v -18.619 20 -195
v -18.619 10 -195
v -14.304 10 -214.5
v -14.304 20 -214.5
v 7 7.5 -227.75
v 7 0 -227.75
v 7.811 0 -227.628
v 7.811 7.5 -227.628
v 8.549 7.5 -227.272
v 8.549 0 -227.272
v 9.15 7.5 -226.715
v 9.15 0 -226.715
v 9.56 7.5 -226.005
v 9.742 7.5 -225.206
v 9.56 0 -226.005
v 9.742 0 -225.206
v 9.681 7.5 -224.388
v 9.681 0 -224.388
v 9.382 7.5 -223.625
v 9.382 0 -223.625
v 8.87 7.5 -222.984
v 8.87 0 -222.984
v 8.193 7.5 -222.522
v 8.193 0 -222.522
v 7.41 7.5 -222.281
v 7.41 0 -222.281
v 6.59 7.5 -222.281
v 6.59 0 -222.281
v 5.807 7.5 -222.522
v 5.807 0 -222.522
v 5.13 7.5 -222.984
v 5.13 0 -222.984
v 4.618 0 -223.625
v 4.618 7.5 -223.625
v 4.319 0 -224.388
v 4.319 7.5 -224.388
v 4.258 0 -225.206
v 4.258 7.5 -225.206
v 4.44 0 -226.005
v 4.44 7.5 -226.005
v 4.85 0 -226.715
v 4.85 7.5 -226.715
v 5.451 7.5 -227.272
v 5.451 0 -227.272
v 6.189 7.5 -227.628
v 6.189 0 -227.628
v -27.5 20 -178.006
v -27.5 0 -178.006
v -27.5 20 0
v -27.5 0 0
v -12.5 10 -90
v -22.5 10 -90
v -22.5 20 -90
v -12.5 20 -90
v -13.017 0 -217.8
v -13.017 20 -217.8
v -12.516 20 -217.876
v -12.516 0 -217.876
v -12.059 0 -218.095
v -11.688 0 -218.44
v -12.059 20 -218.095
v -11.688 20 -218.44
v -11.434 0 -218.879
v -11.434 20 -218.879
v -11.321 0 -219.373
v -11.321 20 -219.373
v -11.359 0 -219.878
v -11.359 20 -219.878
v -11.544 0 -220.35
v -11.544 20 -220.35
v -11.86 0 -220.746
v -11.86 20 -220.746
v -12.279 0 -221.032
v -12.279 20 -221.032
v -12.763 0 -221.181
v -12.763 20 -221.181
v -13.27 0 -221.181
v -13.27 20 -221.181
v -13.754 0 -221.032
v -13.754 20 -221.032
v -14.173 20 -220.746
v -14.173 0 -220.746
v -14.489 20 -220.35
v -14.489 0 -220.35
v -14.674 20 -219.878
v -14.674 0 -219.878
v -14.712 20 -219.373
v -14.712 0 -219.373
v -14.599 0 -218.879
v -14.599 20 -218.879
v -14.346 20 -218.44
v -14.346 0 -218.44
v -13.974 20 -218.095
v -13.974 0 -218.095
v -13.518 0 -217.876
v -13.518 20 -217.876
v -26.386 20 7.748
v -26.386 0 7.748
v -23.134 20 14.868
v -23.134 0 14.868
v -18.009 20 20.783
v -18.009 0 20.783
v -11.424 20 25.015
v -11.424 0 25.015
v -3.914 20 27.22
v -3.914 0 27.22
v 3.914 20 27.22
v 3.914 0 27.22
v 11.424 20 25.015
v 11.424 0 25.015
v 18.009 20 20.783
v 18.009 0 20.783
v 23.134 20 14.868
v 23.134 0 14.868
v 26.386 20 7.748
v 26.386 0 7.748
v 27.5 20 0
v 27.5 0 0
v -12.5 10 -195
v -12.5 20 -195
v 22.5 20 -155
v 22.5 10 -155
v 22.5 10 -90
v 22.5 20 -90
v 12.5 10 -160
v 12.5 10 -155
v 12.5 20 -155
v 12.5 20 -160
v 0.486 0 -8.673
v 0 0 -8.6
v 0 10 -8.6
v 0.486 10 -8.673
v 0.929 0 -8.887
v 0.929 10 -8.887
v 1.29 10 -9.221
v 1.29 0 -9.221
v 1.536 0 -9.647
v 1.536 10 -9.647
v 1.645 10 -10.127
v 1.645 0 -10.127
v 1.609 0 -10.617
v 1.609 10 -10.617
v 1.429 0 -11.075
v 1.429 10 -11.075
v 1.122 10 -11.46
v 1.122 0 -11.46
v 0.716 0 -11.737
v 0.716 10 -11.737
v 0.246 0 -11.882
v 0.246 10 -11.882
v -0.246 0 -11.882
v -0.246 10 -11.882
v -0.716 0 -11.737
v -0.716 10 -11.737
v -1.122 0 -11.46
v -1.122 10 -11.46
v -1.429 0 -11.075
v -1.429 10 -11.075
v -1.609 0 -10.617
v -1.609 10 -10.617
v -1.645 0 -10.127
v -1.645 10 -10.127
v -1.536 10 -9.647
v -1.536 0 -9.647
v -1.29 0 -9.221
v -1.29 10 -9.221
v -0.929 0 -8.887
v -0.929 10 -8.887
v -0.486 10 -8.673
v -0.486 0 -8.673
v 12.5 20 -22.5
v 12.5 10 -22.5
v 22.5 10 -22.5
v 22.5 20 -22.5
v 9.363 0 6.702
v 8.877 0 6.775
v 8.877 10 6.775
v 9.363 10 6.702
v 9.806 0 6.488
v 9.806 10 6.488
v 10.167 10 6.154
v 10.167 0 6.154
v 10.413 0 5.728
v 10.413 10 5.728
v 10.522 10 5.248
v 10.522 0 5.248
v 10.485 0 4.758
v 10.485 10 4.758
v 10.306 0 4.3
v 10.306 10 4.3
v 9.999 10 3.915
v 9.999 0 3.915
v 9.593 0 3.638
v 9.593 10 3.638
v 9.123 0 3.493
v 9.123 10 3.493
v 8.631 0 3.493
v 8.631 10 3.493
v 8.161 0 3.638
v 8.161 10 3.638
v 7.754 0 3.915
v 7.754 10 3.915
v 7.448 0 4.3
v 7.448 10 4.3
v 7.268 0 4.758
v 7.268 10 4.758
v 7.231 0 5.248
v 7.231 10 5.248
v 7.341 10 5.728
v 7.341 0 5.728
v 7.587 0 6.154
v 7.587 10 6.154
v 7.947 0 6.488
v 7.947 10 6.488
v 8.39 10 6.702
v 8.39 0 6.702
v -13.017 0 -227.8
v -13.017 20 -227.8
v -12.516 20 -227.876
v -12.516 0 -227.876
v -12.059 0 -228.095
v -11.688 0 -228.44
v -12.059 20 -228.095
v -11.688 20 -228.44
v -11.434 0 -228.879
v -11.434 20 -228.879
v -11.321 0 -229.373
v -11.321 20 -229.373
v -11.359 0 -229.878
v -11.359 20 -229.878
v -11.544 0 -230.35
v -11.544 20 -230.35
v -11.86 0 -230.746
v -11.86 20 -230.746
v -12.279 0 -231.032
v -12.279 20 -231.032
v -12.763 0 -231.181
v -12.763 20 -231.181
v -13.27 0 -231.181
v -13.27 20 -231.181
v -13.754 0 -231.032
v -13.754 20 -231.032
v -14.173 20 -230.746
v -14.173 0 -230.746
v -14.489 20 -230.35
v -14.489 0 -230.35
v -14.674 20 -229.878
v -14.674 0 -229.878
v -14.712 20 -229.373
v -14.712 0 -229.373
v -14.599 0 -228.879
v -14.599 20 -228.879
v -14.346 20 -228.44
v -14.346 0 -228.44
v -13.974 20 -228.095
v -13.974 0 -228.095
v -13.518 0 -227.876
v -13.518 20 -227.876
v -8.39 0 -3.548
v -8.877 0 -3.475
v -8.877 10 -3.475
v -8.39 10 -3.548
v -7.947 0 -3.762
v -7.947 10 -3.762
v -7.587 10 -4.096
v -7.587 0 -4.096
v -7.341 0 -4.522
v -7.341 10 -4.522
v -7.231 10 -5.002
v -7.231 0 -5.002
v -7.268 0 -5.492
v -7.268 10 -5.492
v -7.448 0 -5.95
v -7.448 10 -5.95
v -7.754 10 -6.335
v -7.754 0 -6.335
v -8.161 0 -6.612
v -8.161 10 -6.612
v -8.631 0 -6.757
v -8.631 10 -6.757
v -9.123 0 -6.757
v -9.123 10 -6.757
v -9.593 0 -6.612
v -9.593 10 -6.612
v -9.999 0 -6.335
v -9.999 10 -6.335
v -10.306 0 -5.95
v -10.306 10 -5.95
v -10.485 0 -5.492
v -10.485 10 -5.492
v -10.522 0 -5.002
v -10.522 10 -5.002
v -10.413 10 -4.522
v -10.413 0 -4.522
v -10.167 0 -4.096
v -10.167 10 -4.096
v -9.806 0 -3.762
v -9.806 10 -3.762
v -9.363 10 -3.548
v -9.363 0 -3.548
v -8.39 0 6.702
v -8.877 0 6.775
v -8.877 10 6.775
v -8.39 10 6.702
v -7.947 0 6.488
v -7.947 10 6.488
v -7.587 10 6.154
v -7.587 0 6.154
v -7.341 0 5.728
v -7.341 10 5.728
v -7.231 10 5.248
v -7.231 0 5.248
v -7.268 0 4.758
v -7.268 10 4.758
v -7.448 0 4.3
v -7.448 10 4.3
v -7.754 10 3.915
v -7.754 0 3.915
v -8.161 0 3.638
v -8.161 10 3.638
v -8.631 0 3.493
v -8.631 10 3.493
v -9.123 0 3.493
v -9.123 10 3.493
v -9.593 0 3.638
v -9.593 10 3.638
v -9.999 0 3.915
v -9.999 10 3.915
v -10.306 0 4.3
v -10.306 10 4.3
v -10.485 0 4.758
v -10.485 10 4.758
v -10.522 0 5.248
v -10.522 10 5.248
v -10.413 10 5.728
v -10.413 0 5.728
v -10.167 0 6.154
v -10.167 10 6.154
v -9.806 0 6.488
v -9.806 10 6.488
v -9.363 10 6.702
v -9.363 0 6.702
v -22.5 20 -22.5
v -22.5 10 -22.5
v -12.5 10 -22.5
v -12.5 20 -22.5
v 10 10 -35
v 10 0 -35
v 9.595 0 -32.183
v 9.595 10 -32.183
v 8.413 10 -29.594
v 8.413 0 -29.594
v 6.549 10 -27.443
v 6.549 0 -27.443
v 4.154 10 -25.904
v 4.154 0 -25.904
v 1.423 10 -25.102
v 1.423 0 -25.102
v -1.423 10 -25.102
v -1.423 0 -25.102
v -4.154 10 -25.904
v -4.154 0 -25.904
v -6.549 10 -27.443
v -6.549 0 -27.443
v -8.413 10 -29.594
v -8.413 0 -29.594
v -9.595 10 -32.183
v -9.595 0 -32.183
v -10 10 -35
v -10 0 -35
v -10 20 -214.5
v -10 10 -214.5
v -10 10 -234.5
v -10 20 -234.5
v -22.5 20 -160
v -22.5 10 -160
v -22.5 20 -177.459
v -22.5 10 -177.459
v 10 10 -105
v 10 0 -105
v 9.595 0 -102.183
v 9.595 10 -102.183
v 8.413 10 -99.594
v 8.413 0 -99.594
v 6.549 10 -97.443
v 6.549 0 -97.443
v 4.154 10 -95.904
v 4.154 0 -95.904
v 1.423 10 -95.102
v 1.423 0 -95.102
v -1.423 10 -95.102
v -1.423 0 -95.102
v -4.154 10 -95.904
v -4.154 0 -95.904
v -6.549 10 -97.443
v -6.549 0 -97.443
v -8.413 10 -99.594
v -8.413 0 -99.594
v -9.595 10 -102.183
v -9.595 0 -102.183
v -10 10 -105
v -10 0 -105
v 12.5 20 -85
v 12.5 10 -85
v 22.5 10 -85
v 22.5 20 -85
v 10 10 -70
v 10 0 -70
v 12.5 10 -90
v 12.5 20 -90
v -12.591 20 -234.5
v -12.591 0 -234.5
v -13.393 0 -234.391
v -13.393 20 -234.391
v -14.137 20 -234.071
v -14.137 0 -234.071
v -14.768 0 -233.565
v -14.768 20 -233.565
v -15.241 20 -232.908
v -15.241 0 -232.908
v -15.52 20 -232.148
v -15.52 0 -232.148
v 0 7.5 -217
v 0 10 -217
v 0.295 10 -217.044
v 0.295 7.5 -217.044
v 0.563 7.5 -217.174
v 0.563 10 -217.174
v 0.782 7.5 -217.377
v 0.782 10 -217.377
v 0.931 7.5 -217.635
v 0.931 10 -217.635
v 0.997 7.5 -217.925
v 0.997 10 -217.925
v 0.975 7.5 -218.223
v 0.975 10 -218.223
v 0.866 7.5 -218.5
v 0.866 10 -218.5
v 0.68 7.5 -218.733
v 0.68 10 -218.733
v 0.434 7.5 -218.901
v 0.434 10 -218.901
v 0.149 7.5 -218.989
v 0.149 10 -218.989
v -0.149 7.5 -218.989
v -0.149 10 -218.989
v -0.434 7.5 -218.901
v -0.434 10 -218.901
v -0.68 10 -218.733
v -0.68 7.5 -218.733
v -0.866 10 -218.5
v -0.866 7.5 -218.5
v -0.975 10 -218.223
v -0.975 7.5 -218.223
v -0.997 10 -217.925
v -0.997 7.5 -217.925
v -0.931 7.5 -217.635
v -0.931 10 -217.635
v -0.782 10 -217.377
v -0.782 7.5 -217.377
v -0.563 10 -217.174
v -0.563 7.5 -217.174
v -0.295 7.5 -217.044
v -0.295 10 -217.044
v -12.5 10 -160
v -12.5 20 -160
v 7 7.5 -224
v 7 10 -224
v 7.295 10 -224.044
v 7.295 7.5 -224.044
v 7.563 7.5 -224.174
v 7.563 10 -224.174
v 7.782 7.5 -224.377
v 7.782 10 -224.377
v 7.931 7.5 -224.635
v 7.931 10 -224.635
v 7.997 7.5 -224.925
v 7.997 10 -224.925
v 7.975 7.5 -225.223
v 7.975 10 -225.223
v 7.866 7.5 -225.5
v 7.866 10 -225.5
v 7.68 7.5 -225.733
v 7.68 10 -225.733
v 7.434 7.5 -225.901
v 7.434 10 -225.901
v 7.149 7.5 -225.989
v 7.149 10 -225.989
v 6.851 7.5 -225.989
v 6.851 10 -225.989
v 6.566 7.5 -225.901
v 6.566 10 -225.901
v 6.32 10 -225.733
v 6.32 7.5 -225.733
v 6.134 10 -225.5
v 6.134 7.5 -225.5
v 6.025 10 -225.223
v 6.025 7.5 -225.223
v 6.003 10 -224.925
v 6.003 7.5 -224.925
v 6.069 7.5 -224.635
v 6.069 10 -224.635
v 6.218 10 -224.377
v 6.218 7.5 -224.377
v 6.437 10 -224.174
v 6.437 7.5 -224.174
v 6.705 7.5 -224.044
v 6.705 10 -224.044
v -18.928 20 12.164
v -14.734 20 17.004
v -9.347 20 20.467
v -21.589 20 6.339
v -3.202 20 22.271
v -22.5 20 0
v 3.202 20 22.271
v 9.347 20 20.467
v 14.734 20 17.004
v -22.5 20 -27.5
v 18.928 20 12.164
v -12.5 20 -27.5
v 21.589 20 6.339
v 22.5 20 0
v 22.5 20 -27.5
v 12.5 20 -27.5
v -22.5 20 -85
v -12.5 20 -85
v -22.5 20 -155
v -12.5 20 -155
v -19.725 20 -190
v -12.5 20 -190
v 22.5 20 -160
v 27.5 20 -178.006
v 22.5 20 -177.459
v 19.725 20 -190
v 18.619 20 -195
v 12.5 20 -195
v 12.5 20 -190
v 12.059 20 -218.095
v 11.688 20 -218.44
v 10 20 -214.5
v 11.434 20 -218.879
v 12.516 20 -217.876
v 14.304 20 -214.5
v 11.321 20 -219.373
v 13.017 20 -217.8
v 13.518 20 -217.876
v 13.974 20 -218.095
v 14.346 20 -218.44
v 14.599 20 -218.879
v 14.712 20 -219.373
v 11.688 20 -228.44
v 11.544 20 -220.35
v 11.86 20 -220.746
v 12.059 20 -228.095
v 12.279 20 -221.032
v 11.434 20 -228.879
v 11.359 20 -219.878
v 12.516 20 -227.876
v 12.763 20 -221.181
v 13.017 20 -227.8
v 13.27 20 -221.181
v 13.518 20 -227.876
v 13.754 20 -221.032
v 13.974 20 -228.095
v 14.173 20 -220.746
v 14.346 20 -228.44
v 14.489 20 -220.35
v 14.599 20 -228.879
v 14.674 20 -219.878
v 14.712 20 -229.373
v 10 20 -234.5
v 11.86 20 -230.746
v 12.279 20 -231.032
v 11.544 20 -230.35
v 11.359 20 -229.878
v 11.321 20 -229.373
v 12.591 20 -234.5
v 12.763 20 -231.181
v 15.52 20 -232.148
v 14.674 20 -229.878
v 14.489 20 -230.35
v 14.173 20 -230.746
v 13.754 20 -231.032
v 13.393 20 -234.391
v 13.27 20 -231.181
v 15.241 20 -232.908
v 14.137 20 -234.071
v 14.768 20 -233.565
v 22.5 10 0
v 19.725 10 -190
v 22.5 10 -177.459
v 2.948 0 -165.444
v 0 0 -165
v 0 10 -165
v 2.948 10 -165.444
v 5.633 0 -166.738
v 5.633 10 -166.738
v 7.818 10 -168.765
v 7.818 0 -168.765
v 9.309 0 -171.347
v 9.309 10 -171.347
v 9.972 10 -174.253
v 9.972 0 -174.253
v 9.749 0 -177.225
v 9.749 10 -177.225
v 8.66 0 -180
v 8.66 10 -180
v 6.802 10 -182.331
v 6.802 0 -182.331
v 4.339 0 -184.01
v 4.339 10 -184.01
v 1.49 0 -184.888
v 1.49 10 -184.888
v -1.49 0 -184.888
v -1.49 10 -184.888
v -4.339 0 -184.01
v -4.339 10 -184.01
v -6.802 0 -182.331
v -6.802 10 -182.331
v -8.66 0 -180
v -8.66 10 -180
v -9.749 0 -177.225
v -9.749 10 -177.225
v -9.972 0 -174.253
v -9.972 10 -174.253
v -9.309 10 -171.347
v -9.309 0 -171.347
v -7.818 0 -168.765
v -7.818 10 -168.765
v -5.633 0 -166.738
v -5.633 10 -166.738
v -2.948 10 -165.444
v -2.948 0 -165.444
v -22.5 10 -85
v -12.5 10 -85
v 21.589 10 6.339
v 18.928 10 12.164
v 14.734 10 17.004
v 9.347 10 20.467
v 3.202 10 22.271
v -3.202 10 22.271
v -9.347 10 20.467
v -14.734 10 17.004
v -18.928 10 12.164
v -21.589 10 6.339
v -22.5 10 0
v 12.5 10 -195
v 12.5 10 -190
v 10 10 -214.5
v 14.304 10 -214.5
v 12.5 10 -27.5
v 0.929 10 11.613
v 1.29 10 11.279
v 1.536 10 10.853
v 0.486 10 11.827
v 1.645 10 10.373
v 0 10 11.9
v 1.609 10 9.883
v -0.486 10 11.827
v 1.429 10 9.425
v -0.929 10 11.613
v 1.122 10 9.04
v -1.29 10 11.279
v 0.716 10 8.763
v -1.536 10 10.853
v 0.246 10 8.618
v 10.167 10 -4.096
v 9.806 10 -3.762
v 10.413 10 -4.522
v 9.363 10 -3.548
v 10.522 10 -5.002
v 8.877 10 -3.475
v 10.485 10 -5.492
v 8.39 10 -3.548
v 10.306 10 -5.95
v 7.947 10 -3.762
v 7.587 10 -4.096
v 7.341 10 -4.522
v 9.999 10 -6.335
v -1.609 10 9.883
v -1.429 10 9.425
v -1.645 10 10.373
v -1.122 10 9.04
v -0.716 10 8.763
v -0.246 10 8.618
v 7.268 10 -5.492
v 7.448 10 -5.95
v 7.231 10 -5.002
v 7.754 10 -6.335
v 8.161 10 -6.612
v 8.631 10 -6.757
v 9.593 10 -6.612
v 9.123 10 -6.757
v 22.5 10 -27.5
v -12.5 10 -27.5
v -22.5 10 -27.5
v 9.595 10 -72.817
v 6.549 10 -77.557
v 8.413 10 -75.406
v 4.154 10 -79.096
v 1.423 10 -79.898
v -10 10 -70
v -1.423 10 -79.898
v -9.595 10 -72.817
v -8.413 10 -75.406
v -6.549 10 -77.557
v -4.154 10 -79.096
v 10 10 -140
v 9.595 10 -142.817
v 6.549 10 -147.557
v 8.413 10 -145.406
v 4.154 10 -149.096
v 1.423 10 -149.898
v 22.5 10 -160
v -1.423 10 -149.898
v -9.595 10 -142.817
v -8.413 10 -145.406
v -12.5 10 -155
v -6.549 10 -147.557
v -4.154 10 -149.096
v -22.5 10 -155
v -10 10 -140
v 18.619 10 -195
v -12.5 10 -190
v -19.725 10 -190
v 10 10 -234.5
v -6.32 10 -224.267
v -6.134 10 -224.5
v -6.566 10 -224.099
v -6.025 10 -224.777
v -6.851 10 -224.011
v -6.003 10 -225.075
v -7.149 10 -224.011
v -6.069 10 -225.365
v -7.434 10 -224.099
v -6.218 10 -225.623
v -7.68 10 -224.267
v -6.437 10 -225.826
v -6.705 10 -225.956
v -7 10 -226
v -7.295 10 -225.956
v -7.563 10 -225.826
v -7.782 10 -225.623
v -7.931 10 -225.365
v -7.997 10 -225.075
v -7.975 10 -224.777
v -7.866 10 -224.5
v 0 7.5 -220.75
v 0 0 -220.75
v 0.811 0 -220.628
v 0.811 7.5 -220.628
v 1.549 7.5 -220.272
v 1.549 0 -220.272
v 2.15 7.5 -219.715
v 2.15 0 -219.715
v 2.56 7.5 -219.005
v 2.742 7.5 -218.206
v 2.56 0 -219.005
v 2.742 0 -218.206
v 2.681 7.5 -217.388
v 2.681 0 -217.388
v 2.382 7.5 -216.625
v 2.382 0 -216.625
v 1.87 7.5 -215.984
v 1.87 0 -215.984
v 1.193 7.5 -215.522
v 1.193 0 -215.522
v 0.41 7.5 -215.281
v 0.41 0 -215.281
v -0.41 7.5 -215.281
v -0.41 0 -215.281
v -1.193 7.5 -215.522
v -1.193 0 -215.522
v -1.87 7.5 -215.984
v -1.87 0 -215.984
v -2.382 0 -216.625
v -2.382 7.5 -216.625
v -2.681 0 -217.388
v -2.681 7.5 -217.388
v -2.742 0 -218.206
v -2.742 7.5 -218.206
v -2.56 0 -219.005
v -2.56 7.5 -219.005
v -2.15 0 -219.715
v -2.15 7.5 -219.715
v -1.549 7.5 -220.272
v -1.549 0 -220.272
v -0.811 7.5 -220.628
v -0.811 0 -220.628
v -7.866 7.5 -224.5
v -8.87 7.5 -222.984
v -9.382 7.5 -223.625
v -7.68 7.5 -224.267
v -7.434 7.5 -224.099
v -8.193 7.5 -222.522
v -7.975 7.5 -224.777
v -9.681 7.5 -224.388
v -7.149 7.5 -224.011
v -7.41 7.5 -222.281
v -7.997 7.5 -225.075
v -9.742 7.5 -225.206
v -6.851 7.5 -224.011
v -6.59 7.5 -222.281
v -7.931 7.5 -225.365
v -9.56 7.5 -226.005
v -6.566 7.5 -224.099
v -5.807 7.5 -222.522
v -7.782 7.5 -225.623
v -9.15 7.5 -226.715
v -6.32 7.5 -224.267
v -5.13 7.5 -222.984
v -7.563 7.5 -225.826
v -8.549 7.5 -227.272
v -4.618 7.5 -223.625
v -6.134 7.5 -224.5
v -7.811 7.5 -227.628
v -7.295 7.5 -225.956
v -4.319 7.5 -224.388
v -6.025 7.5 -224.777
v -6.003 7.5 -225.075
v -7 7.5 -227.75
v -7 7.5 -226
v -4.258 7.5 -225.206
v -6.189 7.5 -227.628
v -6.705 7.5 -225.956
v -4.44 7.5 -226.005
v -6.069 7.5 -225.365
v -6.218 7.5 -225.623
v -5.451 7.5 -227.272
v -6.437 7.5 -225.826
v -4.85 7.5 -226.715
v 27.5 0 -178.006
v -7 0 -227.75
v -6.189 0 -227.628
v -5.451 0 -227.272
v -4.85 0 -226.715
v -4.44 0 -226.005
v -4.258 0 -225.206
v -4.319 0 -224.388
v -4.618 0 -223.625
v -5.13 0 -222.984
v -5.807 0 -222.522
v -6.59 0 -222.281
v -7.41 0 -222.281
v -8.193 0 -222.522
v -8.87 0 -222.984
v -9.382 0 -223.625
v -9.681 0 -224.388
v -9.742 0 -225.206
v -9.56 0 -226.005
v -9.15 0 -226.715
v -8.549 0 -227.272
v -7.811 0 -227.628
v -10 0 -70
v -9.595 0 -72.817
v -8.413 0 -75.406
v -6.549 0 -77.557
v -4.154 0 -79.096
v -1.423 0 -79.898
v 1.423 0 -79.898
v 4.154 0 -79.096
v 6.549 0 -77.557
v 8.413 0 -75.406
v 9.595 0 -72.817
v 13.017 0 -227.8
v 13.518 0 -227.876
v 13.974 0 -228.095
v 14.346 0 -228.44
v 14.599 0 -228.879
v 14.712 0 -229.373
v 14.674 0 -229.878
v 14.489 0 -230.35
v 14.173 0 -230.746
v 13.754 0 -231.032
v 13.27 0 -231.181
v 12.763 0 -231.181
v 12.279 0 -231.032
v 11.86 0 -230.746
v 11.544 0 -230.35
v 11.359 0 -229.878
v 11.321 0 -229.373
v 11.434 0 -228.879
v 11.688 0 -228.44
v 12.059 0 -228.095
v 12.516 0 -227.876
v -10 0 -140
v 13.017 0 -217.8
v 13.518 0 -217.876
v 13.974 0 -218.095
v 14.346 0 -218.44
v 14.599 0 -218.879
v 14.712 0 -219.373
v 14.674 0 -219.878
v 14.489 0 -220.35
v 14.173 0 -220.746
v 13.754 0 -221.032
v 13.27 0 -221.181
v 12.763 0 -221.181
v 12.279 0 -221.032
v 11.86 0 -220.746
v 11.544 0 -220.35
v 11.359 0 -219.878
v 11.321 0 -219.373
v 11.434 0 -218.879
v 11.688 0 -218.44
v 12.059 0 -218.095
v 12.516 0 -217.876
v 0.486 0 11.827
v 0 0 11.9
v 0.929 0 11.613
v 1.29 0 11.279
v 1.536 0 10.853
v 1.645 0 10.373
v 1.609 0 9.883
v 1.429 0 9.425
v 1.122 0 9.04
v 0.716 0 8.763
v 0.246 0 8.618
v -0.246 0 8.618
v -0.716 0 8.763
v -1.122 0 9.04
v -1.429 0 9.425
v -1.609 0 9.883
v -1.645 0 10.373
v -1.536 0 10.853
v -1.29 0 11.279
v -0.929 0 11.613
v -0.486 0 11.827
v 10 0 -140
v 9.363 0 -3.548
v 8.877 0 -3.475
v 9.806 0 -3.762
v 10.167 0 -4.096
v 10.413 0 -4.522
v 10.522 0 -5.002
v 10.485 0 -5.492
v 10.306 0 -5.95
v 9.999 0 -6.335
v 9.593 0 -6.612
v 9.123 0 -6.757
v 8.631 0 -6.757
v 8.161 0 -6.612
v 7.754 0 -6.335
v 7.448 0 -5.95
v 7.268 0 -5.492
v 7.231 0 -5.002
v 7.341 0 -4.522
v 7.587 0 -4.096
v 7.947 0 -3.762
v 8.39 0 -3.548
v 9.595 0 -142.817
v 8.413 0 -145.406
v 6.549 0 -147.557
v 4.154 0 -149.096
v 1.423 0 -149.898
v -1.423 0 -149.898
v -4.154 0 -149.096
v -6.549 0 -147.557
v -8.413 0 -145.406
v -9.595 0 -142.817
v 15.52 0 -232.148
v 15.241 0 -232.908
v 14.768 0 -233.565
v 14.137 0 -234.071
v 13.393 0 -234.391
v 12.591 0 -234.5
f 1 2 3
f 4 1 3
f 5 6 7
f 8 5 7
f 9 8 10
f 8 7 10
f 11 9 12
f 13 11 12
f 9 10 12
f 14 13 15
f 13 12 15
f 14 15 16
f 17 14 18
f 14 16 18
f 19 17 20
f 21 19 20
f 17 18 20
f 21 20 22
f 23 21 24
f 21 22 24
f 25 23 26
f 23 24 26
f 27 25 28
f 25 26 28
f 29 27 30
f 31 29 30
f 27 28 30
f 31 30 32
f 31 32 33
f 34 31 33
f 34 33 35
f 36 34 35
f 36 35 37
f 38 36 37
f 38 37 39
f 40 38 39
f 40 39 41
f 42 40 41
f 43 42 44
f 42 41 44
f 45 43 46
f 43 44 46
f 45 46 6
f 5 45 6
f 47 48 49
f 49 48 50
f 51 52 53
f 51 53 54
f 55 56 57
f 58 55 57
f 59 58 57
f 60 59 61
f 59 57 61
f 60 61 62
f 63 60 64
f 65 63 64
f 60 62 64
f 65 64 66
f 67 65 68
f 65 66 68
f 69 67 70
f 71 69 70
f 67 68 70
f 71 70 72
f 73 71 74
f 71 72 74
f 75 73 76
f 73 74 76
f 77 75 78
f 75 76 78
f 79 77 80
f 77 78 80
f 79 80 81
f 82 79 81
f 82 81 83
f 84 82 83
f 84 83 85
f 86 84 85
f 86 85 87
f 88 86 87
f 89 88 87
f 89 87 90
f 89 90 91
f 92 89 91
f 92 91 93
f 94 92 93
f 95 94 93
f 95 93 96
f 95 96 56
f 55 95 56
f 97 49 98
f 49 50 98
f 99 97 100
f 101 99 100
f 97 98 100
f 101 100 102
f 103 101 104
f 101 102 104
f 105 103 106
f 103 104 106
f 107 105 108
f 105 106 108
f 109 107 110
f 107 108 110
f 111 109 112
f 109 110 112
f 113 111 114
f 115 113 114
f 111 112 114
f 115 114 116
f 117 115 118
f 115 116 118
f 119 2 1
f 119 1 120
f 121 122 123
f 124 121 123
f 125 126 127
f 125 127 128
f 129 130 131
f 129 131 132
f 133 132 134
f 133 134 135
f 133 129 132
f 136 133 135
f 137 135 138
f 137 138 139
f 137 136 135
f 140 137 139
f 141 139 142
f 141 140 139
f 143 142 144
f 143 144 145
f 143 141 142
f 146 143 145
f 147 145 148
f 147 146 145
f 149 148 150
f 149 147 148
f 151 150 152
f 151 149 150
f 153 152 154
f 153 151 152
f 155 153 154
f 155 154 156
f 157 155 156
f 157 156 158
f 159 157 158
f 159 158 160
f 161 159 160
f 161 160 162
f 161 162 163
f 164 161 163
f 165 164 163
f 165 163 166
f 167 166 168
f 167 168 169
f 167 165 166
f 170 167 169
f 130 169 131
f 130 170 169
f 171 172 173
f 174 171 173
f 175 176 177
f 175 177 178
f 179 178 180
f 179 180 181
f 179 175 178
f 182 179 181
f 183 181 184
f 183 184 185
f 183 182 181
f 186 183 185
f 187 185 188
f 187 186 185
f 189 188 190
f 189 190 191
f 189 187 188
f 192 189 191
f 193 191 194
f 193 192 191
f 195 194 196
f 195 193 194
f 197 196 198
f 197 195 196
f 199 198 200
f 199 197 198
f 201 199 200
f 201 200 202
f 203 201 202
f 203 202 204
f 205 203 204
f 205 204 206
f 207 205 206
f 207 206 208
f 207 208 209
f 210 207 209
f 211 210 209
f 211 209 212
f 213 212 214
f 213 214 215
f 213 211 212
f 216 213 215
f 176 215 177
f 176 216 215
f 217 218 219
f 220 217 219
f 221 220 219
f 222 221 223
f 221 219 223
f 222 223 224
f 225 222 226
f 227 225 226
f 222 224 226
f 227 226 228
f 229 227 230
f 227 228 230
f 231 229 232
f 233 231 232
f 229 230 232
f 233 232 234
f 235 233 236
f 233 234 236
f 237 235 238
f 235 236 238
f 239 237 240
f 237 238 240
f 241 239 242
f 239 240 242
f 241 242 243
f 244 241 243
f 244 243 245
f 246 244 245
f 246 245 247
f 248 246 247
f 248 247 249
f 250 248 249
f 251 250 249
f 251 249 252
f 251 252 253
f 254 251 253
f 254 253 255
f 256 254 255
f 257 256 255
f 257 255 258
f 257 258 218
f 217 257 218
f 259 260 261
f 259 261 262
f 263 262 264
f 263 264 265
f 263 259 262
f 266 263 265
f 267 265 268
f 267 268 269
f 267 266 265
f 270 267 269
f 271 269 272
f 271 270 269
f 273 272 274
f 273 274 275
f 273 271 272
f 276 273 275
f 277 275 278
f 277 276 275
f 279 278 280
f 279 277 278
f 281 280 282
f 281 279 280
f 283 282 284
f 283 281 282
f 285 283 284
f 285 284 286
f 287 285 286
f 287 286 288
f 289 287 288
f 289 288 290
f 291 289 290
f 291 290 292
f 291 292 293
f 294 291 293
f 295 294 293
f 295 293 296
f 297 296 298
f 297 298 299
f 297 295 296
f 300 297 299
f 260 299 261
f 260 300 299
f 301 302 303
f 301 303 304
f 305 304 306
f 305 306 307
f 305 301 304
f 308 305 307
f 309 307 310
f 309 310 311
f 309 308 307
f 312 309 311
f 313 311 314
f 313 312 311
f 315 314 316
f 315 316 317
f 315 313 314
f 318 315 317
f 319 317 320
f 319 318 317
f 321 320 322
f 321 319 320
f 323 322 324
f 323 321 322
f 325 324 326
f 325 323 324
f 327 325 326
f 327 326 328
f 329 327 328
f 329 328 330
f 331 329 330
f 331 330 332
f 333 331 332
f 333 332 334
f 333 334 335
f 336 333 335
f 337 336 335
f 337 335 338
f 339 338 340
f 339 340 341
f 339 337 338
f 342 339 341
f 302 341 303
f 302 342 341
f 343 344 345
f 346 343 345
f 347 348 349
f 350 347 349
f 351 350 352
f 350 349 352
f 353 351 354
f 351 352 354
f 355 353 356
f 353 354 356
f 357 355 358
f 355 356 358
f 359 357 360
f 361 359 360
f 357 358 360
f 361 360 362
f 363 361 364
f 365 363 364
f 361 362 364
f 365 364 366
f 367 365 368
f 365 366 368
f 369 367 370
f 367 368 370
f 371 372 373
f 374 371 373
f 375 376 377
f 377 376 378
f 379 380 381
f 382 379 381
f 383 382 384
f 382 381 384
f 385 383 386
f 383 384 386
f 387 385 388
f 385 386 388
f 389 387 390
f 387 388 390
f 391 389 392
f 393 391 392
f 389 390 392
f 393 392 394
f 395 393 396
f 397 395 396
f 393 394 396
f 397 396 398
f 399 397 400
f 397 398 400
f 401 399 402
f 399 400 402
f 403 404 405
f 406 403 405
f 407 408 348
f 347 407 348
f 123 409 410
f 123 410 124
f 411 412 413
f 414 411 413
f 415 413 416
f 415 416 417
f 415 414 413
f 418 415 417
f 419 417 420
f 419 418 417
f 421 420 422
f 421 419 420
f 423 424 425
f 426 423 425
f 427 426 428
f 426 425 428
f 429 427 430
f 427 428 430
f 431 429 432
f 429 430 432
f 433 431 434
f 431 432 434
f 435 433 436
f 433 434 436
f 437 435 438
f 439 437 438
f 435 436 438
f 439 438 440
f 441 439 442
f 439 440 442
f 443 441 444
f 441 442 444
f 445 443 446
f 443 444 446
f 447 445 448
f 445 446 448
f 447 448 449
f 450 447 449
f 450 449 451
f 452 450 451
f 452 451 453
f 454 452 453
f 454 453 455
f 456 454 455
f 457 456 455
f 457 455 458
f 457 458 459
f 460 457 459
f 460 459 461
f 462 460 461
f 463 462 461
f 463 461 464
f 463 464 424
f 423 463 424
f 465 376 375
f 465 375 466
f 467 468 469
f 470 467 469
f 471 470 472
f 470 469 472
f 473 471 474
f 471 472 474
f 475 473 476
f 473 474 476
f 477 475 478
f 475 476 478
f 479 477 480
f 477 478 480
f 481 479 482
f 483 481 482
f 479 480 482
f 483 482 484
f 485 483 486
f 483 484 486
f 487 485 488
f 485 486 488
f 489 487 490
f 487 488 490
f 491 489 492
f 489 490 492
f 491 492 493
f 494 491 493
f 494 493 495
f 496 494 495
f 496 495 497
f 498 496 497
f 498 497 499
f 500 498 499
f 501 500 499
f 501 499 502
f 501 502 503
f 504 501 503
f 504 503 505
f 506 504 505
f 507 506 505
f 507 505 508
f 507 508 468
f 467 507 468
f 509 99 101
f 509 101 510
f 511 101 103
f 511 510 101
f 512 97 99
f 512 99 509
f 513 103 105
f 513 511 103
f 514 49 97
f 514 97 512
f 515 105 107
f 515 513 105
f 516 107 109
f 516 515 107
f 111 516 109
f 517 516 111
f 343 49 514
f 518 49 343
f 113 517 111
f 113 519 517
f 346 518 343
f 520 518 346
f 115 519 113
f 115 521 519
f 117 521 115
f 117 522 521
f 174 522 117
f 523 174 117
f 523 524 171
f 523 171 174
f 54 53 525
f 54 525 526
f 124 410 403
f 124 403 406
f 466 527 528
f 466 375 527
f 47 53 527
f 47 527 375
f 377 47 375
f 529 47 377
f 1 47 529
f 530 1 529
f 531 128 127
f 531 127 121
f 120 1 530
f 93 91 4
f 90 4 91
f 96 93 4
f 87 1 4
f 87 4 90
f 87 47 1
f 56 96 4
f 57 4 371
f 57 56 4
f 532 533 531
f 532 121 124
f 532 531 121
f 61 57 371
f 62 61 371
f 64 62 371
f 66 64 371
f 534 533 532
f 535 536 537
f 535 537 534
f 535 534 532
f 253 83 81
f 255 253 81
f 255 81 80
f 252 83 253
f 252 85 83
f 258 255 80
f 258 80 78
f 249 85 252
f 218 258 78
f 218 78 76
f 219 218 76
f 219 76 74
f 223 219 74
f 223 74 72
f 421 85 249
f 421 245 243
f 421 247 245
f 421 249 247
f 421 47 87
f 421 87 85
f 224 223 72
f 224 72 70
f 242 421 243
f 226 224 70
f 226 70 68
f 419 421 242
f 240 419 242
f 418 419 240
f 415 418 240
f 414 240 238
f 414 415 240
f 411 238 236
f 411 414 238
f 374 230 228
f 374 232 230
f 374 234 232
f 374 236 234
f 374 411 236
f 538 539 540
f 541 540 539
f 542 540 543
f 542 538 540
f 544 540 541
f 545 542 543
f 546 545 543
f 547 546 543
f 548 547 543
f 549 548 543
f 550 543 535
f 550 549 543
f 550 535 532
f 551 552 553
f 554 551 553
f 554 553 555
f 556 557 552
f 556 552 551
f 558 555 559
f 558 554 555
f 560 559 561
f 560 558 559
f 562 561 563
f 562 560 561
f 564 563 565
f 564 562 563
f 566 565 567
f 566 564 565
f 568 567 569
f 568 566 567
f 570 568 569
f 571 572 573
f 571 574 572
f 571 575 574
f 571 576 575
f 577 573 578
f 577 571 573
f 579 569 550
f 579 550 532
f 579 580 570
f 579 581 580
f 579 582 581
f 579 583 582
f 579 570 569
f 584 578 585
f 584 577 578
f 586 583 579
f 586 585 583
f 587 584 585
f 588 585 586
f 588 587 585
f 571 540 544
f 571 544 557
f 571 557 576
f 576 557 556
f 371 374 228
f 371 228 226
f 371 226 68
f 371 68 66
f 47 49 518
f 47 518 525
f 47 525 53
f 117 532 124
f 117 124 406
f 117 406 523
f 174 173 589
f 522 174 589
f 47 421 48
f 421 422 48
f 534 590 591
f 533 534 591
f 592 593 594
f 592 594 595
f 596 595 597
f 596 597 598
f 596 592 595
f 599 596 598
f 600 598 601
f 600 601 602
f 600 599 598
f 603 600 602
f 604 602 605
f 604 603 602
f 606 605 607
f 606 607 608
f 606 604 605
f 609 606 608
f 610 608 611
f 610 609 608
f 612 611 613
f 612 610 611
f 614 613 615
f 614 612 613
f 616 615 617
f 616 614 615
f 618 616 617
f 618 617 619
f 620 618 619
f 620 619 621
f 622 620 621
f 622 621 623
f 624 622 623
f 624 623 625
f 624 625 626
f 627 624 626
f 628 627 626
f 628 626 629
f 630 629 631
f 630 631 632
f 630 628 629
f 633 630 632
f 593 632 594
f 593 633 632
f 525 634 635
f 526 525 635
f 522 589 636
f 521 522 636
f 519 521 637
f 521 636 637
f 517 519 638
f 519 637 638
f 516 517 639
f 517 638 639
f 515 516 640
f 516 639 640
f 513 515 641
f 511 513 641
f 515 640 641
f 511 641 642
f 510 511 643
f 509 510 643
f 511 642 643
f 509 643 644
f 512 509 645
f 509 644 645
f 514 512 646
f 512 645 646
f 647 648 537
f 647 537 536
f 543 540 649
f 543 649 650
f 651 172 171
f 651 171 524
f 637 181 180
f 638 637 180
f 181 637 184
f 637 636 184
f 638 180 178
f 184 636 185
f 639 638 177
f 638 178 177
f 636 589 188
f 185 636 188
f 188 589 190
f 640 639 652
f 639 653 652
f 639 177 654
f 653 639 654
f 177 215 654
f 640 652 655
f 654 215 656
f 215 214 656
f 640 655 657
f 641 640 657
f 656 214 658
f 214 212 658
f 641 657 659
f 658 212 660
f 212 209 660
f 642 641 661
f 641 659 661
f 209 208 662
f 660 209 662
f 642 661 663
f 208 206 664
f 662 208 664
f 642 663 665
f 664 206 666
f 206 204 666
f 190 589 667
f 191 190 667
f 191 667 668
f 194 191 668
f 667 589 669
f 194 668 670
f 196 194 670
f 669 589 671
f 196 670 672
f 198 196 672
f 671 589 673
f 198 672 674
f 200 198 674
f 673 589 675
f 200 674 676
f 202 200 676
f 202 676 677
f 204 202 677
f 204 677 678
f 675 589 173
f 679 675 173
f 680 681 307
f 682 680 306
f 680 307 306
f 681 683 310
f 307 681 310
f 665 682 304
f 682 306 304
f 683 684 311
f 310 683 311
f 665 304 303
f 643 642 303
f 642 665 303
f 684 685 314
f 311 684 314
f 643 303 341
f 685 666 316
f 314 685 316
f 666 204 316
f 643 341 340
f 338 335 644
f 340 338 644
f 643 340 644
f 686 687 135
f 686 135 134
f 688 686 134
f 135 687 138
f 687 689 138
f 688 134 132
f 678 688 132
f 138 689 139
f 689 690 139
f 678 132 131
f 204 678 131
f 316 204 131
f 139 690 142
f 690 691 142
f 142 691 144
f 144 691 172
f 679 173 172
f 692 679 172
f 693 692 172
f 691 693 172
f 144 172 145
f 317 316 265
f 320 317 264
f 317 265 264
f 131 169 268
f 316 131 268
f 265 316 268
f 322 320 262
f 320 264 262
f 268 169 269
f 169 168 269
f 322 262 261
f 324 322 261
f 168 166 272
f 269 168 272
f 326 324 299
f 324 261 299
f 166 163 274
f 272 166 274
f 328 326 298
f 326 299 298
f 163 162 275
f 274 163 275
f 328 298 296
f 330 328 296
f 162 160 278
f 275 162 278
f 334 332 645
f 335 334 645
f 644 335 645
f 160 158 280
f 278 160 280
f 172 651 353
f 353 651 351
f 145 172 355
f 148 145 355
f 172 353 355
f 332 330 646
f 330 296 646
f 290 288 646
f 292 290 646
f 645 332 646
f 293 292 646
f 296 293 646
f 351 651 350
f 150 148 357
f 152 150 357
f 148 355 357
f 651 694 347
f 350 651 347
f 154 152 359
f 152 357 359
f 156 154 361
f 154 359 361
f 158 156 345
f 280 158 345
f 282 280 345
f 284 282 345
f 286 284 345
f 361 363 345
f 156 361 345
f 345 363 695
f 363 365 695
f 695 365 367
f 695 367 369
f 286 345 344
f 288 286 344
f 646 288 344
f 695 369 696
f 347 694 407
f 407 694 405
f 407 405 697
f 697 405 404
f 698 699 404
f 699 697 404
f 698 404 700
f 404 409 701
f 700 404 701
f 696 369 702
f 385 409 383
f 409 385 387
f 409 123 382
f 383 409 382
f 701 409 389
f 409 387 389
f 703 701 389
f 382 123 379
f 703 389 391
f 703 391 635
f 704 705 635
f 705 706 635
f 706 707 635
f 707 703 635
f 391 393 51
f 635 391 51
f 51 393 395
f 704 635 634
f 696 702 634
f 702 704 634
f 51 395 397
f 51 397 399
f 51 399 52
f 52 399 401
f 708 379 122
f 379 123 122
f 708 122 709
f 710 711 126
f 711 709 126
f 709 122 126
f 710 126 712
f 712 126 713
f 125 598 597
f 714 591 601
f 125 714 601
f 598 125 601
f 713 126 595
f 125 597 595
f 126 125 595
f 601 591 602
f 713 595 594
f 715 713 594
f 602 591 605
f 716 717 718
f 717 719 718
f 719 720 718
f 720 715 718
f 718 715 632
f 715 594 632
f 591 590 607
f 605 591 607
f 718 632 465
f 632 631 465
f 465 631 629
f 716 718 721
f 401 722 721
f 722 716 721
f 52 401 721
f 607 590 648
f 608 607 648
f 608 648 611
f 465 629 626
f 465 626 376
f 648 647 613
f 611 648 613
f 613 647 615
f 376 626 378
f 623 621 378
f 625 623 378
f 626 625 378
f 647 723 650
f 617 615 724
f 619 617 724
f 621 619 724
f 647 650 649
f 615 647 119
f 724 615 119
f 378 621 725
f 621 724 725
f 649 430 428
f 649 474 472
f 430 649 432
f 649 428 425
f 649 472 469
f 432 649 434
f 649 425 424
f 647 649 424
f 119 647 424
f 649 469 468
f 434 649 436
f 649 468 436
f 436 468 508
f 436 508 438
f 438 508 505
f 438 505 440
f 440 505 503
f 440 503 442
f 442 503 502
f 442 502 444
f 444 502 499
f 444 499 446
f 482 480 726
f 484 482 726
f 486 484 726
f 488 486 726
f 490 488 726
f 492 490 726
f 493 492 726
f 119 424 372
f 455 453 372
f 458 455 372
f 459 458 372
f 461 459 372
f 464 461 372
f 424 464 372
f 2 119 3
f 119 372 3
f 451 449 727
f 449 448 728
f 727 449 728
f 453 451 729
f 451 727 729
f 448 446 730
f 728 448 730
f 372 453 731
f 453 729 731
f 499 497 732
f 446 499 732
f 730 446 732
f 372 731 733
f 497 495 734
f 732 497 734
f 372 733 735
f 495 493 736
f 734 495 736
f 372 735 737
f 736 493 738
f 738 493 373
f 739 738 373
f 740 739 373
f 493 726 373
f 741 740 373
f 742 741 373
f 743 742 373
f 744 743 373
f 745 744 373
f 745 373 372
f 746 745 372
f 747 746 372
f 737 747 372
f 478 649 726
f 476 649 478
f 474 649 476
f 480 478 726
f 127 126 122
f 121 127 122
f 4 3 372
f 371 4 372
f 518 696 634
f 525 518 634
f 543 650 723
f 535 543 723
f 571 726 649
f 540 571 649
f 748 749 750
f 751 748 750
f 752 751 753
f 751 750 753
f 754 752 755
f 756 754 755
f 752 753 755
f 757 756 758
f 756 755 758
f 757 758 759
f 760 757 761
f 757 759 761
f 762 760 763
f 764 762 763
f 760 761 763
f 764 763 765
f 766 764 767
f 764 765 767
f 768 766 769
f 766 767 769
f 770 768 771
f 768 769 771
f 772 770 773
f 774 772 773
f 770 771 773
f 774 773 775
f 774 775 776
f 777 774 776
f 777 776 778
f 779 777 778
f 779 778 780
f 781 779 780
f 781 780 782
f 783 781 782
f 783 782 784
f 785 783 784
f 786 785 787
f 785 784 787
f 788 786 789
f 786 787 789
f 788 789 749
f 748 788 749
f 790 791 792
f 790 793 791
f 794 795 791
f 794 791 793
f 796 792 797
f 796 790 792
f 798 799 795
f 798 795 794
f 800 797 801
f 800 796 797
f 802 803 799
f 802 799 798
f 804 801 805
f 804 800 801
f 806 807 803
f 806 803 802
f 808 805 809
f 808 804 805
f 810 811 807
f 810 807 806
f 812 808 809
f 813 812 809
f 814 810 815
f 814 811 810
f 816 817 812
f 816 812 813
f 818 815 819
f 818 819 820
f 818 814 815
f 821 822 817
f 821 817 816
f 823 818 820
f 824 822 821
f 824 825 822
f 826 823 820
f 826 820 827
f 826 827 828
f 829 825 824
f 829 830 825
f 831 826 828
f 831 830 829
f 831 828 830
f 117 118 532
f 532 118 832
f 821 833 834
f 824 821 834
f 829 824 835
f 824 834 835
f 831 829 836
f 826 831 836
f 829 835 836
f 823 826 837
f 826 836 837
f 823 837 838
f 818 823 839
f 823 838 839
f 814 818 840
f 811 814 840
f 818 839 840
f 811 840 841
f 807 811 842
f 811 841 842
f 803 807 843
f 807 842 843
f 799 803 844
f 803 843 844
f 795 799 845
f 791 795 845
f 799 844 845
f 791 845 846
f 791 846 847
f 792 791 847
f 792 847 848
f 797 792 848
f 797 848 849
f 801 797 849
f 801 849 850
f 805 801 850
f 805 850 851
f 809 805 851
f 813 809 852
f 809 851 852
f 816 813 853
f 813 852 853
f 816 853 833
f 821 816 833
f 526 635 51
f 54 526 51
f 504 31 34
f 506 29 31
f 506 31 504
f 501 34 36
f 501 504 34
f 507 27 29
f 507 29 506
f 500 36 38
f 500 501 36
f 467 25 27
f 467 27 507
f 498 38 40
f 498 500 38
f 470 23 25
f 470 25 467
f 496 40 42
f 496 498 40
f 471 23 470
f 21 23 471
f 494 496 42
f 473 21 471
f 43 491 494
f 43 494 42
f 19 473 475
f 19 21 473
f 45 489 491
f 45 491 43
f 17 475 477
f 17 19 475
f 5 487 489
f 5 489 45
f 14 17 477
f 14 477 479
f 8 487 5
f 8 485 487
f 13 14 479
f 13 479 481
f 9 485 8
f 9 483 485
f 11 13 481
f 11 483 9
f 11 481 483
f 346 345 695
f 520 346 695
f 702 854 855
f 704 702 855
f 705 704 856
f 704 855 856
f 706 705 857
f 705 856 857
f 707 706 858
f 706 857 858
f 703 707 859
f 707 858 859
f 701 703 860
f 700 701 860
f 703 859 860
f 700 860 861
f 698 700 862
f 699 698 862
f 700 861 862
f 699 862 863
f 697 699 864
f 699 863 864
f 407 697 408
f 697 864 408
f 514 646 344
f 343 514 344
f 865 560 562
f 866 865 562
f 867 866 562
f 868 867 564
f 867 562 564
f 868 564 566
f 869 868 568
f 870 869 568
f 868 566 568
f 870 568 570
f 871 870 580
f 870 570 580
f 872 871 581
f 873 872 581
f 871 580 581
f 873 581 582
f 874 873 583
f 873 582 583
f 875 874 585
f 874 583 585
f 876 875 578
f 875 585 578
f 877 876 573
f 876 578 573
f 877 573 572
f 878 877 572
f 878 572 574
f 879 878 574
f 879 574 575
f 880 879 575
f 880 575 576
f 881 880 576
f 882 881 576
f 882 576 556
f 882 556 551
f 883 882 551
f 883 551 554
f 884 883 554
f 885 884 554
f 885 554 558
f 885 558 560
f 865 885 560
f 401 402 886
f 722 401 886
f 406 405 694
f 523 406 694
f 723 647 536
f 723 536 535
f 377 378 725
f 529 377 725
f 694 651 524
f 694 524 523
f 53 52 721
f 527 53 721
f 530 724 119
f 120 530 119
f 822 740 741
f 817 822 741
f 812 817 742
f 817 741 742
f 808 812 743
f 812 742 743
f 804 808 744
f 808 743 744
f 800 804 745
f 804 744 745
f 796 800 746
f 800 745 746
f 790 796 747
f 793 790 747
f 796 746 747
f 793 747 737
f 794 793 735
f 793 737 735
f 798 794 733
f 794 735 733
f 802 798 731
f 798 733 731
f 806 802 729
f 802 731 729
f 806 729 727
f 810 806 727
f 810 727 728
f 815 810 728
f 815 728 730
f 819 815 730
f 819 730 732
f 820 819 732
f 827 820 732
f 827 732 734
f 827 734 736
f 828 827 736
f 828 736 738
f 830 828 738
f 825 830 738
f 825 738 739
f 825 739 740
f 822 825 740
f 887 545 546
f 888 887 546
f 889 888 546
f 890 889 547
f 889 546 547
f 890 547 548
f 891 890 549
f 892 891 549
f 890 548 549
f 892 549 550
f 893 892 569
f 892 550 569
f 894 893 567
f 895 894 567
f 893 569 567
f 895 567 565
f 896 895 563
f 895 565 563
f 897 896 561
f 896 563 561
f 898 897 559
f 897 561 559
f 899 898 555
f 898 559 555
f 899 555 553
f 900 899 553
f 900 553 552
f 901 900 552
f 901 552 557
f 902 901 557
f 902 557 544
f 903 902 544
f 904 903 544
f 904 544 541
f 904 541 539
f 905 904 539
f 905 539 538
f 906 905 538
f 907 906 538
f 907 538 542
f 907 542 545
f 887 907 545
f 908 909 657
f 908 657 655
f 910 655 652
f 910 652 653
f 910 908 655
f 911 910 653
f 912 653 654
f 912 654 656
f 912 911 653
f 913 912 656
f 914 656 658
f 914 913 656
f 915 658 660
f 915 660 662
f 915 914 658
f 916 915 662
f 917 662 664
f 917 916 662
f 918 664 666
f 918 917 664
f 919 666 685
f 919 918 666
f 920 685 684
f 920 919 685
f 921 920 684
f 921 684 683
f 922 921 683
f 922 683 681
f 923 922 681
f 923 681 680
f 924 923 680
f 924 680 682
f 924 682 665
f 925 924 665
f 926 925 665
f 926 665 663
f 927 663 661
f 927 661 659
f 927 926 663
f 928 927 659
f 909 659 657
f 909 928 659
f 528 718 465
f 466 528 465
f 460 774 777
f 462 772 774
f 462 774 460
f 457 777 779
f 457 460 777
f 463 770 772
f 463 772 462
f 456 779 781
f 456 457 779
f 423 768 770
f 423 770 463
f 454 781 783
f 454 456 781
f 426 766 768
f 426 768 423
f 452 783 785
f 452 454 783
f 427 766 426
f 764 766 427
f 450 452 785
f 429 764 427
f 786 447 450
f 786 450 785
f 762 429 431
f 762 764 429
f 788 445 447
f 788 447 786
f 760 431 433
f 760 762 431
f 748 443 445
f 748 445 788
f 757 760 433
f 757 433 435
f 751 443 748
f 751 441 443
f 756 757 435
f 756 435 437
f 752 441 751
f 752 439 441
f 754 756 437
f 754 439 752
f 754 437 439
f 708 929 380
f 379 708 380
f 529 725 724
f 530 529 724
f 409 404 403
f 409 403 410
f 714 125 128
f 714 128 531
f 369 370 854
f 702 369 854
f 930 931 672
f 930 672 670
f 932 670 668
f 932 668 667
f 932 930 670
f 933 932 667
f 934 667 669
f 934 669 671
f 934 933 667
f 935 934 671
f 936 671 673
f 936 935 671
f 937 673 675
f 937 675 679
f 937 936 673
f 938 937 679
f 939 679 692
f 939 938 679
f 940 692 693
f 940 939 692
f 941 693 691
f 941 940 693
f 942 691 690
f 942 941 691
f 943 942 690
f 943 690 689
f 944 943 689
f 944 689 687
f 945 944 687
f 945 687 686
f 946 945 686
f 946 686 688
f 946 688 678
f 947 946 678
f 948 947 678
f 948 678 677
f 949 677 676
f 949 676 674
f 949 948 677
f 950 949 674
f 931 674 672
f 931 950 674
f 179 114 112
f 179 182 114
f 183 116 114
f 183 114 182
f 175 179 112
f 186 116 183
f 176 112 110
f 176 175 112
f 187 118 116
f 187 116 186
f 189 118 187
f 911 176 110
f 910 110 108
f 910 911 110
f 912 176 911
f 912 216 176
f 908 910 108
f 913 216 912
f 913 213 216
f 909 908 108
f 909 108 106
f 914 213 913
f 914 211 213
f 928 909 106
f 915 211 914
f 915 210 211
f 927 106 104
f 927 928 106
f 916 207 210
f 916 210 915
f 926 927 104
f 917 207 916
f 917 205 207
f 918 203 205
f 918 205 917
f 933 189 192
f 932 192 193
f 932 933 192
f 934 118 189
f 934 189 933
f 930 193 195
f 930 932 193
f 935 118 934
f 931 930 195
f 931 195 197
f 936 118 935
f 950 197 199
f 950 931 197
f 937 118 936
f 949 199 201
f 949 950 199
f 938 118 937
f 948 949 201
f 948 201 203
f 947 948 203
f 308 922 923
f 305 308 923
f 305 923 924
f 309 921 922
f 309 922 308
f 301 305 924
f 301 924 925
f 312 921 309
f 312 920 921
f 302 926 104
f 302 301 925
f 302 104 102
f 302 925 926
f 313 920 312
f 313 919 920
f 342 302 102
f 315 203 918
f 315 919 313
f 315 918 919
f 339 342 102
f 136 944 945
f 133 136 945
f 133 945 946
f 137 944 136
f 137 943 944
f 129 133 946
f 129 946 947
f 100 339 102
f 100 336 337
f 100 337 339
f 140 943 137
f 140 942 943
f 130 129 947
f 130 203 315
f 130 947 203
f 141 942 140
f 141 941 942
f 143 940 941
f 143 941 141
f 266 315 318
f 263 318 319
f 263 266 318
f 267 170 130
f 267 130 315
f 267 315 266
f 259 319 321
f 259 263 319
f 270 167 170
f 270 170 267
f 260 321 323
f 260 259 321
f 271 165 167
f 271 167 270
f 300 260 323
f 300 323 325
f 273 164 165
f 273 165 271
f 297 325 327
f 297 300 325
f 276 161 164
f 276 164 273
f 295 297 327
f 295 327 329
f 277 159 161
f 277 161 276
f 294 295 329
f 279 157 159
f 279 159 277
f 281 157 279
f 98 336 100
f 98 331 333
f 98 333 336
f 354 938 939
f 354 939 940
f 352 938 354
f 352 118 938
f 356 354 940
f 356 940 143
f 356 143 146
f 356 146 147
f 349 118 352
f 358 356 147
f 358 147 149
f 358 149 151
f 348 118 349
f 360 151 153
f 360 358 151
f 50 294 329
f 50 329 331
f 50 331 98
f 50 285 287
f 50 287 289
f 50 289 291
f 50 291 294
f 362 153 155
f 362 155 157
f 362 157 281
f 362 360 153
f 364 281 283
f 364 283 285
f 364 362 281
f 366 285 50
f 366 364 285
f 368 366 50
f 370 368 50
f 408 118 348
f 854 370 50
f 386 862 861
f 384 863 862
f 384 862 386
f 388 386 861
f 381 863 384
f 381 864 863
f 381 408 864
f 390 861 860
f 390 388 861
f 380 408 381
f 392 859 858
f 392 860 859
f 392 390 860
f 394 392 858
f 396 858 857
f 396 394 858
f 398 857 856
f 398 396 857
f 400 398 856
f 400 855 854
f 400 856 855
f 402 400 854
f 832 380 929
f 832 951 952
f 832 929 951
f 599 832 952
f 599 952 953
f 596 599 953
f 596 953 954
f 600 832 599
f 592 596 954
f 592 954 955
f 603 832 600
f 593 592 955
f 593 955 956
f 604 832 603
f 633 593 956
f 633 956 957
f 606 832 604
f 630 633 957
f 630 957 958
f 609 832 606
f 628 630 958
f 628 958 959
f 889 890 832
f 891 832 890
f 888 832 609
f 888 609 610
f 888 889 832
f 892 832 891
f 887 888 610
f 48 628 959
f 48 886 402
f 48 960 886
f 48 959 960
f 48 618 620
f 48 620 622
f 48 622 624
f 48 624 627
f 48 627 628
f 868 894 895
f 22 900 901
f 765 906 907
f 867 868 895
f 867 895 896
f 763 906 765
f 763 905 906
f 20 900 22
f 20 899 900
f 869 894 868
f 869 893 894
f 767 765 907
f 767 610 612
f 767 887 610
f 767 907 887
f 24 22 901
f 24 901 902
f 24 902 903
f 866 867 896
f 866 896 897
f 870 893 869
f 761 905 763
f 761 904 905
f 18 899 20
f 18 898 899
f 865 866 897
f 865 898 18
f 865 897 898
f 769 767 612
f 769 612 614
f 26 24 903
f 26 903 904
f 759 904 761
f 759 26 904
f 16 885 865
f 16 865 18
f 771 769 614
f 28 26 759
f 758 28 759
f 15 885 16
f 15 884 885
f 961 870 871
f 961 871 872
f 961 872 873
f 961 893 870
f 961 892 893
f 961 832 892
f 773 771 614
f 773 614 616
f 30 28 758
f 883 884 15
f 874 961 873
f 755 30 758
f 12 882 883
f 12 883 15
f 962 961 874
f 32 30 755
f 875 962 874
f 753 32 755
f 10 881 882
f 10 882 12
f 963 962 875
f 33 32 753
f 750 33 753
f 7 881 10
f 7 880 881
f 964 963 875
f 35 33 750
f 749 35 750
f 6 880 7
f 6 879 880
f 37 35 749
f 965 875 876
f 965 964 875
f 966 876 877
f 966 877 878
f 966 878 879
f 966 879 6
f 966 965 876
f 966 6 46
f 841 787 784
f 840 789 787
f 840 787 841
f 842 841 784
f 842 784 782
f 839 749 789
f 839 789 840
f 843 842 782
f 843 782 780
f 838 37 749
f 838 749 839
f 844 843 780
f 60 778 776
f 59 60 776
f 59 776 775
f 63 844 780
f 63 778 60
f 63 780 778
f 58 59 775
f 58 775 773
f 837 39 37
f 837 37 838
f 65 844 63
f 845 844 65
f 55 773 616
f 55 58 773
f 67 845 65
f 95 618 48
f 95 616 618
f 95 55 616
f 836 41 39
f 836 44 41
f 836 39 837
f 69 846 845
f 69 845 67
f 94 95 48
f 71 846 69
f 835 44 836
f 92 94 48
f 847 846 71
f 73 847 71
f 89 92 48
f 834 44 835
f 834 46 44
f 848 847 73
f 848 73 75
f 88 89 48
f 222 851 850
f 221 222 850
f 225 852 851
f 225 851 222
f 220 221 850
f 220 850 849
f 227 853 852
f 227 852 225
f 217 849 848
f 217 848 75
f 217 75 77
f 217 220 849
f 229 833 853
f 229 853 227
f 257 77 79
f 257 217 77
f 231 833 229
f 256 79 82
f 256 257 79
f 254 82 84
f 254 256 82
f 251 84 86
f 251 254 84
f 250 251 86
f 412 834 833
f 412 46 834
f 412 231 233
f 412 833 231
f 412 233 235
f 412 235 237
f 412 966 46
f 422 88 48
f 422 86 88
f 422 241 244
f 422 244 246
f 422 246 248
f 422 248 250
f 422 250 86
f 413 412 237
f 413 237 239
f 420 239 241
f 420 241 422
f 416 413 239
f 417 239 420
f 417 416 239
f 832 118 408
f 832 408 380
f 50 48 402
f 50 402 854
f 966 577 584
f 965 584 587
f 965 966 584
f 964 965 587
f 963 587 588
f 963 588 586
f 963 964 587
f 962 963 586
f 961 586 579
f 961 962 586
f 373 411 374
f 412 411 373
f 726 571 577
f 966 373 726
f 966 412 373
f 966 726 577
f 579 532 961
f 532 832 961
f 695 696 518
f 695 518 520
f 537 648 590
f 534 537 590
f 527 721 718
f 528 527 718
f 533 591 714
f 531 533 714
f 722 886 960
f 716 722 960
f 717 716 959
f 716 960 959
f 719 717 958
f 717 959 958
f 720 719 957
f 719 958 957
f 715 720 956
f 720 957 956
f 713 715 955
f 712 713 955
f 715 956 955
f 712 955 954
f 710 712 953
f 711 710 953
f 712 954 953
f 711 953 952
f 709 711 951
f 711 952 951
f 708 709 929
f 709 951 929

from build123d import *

# Parameters (mm, degrees)
SKETCH_1_R          = 1.65
SKETCH_1_R_2        = 10
EXTRUDE_1_DEPTH     = 10
EXTRUDE_2_DEPTH     = 10
SKETCH_3_W          = 10
SKETCH_3_H          = 5
SKETCH_3_W_2        = 7.225249319
EXTRUDE_3_DEPTH     = 10
SKETCH_4_R          = 1.7
CUT_EXTRUDE_1_DEPTH = 237.952526891
SKETCH_5_R          = 1
CUT_EXTRUDE_2_DEPTH = 237.318640822
SKETCH_7_R          = 2.75
CUT_EXTRUDE_3_DEPTH = 7.5
FILLET_2_R          = 3


with BuildPart() as part:
    # 草图1 → 凸台-拉伸1 (new body)
    with BuildSketch(Plane(origin=(0, 0, 0), x_dir=(1, 0, 0), z_dir=(0, 1, 0))):
        with BuildLine():
            Line((-27.5, 0), (-27.5, 178.006007136))
            Line((-27.5, 178.006007136), (-15, 234.5))
            Line((-15, 234.5), (15, 234.5))
            Line((15, 234.5), (27.5, 178.006007136))
            Line((27.5, 178.006007136), (27.5, 0))
            ThreePointArc((27.5, 0), (0, -27.5), (-27.5, 0))
        make_face()
        with Locations(Location((0, 10.25, 0), (0, 0, 270))):
            Circle(SKETCH_1_R, mode=Mode.SUBTRACT)
        with Locations(Location((8.876760389, 5.125, 0), (0, 0, 270))):
            Circle(SKETCH_1_R, mode=Mode.SUBTRACT)
        with Locations(Location((8.876760389, -5.125, 0), (0, 0, 270))):
            Circle(SKETCH_1_R, mode=Mode.SUBTRACT)
        with Locations(Location((0, -10.25, 0), (0, 0, 270))):
            Circle(SKETCH_1_R, mode=Mode.SUBTRACT)
        with Locations(Location((-8.876760389, -5.125, 0), (0, 0, 270))):
            Circle(SKETCH_1_R, mode=Mode.SUBTRACT)
        with Locations(Location((-8.876760389, 5.125, 0), (0, 0, 270))):
            Circle(SKETCH_1_R, mode=Mode.SUBTRACT)
        with Locations(Location((0, 175, 0), (0, 0, 270))):
            Circle(SKETCH_1_R_2, mode=Mode.SUBTRACT)
        with BuildLine():
            Line((-10, 105), (-10, 140))
            ThreePointArc((-10, 140), (0, 150), (10, 140))
            Line((10, 140), (10, 105))
            ThreePointArc((10, 105), (0, 95), (-10, 105))
        make_face(mode=Mode.SUBTRACT)
        with BuildLine():
            Line((-10, 35), (-10, 70))
            ThreePointArc((-10, 70), (0, 80), (10, 70))
            Line((10, 70), (10, 35))
            ThreePointArc((10, 35), (0, 25), (-10, 35))
        make_face(mode=Mode.SUBTRACT)
    extrude(amount=EXTRUDE_1_DEPTH)

    # 草图2 → 凸台-拉伸2 (add)
    with BuildSketch(Plane(origin=(0, 10, 0), x_dir=(1, 0, 0), z_dir=(0, 1, 0))):
        with BuildLine():
            ThreePointArc((22.5, 0), (0, -22.5), (-22.5, 0))
            Line((-22.5, 0), (-22.5, 177.459460384))
            Line((-22.5, 177.459460384), (-14.304318978, 214.5))
            Line((-14.304318978, 214.5), (-10, 214.5))
            Line((-10, 214.5), (-10, 234.5))
            Line((-10, 234.5), (-15, 234.5))
            Line((-15, 234.5), (-27.5, 178.006007136))
            Line((-27.5, 178.006007136), (-27.5, 0))
            ThreePointArc((-27.5, 0), (0, -27.5), (27.5, 0))
            Line((27.5, 0), (27.5, 178.006007136))
            Line((27.5, 178.006007136), (15, 234.5))
            Line((15, 234.5), (10, 234.5))
            Line((10, 234.5), (10, 214.5))
            Line((10, 214.5), (14.304318978, 214.5))
            Line((14.304318978, 214.5), (22.5, 177.459460384))
            Line((22.5, 177.459460384), (22.5, 0))
        make_face()
    extrude(amount=EXTRUDE_2_DEPTH)

    # 草图3 → 凸台-拉伸3 (add)
    with BuildSketch(Plane(origin=(0, 10, 0), x_dir=(1, 0, 0), z_dir=(0, 1, 0))):
        with Locations((-17.5, 25)):
            Rectangle(SKETCH_3_W, SKETCH_3_H)
        with Locations((17.5, 25)):
            Rectangle(SKETCH_3_W, SKETCH_3_H)
        with Locations((-17.5, 87.5)):
            Rectangle(SKETCH_3_W, SKETCH_3_H)
        with Locations((17.5, 87.5)):
            Rectangle(SKETCH_3_W, SKETCH_3_H)
        with Locations((-17.5, 157.5)):
            Rectangle(SKETCH_3_W, SKETCH_3_H)
        with Locations((17.5, 157.5)):
            Rectangle(SKETCH_3_W, SKETCH_3_H)
        with Locations((-16.112624659, 192.5)):
            Rectangle(SKETCH_3_W_2, SKETCH_3_H)
        with Locations((16.112624659, 192.5)):
            Rectangle(SKETCH_3_W_2, SKETCH_3_H)
    extrude(amount=EXTRUDE_3_DEPTH)

    # 草图4 → 切除-拉伸1 (cut, through all)
    with BuildSketch(Plane(origin=(0, 20, 0), x_dir=(1, 0, 0), z_dir=(0, 1, 0))):
        with Locations(Location((-13.016675417, 229.5, 0), (0, 0, 270))):
            Circle(SKETCH_4_R)
        with Locations(Location((-13.016675417, 219.5, 0), (0, 0, 270))):
            Circle(SKETCH_4_R)
        with Locations(Location((13.016675417, 229.5, 0), (0, 0, 270))):
            Circle(SKETCH_4_R)
        with Locations(Location((13.016675417, 219.5, 0), (0, 0, 270))):
            Circle(SKETCH_4_R)
    extrude(amount=-CUT_EXTRUDE_1_DEPTH, mode=Mode.SUBTRACT)

    # 草图5 → 切除-拉伸2 (cut, through all)
    with BuildSketch(Plane(origin=(0, 10, 0), x_dir=(1, 0, 0), z_dir=(0, 1, 0))):
        with Locations(Location((0, 218, 0), (0, 0, 270))):
            Circle(SKETCH_5_R)
        with Locations(Location((7, 225, 0), (0, 0, 270))):
            Circle(SKETCH_5_R)
        with Locations(Location((-7, 225, 0), (0, 0, 90))):
            Circle(SKETCH_5_R)
    extrude(amount=-CUT_EXTRUDE_2_DEPTH, mode=Mode.SUBTRACT)

    # 草图7 → 切除-拉伸3 (cut)
    with BuildSketch(Plane.XZ):
        with Locations(Location((0, -218, 0), (0, 0, 270))):
            Circle(SKETCH_7_R)
        with Locations(Location((-7, -225, 0), (0, 0, 270))):
            Circle(SKETCH_7_R)
        with Locations(Location((7, -225, 0), (0, 0, 270))):
            Circle(SKETCH_7_R)
    extrude(amount=-CUT_EXTRUDE_3_DEPTH, mode=Mode.SUBTRACT)

    # 圆角2
    fillet_2_edges = [part.edges().sort_by_distance(p)[0] for p in [
        (-15, 10, -234.5),
        (15, 10, -234.5),
    ]]
    fillet(fillet_2_edges, radius=FILLET_2_R)


solid = part.part
